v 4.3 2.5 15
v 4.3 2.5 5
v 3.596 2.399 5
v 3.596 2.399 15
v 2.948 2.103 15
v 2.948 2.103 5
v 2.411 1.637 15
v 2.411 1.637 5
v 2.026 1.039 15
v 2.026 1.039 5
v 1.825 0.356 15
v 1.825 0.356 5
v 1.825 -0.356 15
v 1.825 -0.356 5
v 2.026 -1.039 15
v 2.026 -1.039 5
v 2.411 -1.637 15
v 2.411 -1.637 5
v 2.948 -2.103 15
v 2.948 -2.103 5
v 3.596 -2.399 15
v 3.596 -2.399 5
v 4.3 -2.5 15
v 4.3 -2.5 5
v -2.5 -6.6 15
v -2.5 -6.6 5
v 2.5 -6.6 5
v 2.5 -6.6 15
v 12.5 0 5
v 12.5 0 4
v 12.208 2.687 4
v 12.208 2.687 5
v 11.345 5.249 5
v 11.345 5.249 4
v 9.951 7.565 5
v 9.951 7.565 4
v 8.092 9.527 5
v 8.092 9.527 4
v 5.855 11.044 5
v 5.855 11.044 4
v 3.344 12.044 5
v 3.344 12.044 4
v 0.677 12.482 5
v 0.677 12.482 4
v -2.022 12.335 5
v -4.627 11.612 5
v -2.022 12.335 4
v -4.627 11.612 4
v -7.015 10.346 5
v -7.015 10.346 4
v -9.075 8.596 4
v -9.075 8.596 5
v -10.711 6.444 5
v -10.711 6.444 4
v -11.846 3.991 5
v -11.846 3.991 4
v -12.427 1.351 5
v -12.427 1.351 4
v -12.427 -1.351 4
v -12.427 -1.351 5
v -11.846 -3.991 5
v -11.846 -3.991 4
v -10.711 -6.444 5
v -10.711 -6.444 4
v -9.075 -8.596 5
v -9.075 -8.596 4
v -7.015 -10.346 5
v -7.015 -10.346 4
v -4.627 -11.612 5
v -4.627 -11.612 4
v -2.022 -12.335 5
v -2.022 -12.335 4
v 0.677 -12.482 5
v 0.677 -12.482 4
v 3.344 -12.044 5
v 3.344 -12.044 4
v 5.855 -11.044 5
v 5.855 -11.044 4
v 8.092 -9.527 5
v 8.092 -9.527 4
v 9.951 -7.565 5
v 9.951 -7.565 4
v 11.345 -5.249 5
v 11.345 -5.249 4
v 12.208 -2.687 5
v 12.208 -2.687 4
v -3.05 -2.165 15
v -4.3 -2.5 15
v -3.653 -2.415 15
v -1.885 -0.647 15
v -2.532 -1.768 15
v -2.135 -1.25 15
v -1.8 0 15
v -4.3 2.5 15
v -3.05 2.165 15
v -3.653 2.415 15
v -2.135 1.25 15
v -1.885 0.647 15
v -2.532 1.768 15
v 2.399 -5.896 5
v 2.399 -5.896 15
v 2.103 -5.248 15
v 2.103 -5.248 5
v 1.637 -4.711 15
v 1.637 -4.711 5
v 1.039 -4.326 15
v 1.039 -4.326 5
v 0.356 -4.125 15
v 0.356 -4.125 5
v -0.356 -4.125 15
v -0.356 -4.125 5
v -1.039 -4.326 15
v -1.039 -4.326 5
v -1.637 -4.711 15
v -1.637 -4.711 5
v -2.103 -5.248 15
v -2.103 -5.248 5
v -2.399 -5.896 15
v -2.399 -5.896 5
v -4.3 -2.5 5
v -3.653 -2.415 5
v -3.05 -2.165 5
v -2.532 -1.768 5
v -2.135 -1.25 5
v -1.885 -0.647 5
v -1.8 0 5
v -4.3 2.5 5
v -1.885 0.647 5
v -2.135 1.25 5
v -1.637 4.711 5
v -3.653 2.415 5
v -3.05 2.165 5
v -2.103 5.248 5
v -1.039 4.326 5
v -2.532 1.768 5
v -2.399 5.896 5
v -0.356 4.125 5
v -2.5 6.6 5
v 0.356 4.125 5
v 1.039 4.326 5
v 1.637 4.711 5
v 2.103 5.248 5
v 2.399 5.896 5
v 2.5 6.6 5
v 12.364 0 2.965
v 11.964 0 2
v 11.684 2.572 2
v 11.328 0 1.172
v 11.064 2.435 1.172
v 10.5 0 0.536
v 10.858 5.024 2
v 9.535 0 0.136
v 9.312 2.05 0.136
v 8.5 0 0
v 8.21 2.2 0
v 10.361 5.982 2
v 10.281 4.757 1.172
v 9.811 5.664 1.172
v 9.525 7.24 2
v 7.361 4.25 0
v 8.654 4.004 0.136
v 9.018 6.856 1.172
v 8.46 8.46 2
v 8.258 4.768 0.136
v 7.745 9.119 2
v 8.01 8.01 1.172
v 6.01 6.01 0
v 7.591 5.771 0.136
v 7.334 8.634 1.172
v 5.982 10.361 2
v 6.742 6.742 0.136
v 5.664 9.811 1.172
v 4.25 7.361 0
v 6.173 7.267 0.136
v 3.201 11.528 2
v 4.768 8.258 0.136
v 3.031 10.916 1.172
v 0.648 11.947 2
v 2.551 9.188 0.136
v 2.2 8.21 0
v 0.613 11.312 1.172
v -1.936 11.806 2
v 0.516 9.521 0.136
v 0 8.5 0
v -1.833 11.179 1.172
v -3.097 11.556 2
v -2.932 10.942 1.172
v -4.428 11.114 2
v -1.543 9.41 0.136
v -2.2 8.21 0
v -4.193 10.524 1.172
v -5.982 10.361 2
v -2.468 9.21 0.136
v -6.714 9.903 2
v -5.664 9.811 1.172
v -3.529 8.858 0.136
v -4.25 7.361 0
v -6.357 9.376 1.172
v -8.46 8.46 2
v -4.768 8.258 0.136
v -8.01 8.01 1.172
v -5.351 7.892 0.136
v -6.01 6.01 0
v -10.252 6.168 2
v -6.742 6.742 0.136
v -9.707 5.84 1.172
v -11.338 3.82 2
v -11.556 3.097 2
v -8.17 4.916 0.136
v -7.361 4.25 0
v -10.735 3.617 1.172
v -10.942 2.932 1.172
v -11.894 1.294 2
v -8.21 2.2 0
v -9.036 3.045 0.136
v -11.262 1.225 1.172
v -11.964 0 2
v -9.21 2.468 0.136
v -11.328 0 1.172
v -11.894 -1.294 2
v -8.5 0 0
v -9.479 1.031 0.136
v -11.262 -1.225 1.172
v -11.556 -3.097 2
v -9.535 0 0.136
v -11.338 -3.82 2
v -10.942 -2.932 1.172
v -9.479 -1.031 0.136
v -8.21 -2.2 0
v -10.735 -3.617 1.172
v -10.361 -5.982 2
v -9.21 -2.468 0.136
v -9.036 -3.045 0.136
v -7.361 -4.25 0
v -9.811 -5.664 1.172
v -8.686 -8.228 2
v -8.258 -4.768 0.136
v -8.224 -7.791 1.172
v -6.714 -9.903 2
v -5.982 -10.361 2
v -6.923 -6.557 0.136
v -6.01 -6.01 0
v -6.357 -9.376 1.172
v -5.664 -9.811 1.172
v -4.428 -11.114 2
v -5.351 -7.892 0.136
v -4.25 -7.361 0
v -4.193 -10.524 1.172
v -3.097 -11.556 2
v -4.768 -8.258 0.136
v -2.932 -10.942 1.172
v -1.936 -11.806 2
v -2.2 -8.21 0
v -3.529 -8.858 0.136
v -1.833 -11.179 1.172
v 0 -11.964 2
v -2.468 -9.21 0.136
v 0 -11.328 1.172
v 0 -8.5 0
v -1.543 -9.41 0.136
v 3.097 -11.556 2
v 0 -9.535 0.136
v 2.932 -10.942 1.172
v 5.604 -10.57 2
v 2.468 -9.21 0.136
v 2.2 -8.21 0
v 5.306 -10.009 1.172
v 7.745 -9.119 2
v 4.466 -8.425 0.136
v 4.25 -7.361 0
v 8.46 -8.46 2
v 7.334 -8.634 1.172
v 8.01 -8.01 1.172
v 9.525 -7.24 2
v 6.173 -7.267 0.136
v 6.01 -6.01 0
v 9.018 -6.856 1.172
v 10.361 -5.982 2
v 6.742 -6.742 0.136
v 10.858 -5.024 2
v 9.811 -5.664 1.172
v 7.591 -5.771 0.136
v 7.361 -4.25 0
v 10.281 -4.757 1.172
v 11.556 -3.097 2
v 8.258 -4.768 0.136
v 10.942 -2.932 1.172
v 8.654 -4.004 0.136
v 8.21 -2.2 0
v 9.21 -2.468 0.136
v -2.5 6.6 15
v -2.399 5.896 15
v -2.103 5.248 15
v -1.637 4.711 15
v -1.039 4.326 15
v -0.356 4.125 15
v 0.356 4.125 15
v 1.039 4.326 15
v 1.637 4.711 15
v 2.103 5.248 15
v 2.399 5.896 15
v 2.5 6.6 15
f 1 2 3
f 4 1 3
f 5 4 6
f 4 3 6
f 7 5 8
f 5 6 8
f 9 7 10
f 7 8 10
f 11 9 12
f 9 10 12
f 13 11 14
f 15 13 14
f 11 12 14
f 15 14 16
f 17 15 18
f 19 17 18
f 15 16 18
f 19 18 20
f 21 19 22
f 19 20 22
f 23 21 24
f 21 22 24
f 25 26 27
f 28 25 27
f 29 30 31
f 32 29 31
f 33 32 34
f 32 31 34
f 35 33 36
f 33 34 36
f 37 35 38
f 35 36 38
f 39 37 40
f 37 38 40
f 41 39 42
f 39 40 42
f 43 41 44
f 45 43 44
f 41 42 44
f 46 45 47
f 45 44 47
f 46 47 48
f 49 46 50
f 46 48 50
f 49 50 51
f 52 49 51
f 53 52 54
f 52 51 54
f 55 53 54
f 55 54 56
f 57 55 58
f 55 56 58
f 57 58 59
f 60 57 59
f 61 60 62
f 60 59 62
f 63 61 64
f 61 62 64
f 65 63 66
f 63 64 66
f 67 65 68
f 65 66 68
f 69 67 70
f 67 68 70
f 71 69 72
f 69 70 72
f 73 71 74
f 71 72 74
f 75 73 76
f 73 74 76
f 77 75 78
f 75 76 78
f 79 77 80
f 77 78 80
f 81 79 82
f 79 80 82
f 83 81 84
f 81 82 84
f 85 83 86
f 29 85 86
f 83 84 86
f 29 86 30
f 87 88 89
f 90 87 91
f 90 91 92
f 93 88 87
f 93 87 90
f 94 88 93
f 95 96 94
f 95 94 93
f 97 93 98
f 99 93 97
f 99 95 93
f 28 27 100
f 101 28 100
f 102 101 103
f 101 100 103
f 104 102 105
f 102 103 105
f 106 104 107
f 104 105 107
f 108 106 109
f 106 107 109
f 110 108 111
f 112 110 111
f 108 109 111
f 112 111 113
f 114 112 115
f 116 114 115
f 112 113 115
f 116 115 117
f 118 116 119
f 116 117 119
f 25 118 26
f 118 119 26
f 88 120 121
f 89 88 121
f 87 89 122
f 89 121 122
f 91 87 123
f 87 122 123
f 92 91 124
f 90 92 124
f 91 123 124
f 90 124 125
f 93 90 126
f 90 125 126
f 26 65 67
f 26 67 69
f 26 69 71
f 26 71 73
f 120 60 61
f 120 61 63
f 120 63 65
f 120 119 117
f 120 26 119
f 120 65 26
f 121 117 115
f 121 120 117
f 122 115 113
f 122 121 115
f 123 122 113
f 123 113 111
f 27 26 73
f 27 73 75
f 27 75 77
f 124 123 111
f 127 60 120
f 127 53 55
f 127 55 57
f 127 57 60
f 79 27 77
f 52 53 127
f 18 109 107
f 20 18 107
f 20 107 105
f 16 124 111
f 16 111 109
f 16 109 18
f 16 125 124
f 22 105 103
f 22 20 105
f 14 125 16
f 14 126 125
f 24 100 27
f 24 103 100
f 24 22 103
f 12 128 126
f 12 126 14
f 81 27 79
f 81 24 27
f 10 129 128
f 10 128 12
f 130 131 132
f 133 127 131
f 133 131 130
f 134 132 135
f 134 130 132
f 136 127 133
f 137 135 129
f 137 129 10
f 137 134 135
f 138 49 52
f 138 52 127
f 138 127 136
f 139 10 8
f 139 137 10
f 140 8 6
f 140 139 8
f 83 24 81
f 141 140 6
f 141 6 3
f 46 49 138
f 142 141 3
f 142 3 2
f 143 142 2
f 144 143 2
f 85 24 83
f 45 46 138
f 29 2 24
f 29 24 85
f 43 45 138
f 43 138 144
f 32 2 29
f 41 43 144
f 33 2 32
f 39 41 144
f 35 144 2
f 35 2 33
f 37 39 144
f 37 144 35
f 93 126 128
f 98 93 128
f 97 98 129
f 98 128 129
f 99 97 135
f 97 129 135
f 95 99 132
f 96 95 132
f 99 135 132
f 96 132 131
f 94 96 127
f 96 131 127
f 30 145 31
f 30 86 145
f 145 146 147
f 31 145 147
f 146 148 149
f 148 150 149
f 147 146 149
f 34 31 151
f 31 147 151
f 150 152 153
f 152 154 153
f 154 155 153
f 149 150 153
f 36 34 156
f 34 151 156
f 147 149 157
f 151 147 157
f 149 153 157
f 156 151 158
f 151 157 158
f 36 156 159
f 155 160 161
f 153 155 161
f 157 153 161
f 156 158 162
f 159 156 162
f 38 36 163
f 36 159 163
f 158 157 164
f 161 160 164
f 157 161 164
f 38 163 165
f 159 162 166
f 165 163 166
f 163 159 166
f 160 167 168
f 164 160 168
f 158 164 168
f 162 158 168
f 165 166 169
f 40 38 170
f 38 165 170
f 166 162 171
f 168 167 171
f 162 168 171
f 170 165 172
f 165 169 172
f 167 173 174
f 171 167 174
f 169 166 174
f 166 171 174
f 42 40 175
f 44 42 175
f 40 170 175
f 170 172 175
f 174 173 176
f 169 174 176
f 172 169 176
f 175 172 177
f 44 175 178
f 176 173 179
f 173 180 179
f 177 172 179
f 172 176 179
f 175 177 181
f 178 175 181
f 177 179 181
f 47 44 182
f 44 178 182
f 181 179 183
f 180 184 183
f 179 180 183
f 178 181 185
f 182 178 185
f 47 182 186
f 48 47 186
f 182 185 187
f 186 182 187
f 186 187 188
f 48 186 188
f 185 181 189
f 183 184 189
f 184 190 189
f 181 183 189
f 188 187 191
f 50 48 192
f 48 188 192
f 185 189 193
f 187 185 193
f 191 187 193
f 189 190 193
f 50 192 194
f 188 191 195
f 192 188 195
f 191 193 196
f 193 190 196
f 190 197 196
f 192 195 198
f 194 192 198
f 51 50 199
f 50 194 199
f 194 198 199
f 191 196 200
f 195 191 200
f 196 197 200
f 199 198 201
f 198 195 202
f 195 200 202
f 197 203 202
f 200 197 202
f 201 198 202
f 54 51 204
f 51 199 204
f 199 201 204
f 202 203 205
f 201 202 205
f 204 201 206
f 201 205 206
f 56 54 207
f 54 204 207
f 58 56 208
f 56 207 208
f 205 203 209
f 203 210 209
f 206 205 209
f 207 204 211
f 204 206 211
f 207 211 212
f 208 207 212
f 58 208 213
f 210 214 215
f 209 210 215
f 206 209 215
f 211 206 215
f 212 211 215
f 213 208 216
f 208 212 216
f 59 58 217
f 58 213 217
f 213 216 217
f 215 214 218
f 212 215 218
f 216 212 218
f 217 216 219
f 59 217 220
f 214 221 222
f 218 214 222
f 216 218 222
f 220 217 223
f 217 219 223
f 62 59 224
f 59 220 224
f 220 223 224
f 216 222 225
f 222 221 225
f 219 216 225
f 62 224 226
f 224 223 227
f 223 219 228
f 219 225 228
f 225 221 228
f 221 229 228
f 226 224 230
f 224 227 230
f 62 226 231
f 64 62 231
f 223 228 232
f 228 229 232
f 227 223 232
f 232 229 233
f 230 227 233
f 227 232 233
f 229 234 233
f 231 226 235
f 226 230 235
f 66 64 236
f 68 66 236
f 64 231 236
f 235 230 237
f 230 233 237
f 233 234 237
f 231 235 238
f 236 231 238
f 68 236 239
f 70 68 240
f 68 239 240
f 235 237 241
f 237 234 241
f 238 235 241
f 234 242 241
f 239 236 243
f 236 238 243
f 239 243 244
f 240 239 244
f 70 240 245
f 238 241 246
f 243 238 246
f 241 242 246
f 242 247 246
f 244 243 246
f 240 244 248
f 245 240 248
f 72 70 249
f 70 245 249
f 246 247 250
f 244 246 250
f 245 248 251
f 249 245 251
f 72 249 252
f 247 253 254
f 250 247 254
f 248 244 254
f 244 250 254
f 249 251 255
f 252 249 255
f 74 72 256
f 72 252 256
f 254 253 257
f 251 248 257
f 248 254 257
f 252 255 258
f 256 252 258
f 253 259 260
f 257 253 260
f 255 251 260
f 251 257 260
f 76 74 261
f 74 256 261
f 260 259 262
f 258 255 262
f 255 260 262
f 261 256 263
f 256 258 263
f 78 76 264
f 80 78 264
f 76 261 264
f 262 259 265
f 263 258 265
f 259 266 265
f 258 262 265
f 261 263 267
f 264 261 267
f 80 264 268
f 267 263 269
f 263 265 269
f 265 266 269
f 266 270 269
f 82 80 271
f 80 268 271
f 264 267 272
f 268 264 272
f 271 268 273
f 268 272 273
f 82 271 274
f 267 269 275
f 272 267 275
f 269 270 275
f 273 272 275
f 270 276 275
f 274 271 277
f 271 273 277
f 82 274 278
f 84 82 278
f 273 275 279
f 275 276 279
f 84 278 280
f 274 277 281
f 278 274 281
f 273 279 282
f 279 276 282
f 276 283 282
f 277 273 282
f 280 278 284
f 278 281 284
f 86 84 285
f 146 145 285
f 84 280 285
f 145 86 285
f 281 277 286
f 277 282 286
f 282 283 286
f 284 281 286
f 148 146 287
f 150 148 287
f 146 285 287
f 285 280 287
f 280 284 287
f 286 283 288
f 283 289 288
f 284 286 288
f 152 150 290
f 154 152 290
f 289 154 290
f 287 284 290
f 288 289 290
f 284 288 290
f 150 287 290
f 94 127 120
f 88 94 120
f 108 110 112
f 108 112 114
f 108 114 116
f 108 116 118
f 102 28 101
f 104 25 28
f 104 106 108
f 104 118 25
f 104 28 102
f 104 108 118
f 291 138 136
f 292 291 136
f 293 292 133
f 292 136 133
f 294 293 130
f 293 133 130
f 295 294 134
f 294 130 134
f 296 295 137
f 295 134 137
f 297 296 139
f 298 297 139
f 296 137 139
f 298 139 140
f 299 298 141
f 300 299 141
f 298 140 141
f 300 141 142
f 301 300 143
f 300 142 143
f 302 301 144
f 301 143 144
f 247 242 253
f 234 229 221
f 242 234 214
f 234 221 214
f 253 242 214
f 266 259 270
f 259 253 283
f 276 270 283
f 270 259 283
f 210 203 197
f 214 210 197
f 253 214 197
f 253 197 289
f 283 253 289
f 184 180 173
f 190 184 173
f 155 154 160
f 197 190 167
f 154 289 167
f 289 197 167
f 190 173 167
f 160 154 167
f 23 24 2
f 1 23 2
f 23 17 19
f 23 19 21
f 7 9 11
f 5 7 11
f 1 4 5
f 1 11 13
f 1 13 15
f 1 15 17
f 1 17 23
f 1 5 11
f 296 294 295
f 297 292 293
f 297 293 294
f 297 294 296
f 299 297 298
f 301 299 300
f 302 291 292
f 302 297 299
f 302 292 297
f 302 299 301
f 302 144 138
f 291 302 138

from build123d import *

# Parameters (mm, degrees)
F0_R     = 12.5
F1_DEPTH = 5
F2_R     = 4
F4_DEPTH = 10


with BuildPart() as f1:
    # F0 (on Top) → F1 (new body)
    with BuildSketch(Plane.XY):
        Circle(F0_R)
    extrude(amount=F1_DEPTH)

    # F2
    f2_edges = [f1.edges().sort_by_distance(p)[0] for p in [
        (-12.5, 0, 0),
    ]]
    fillet(f2_edges, radius=F2_R)

    # F3 (on face) → F4 (join)
    with BuildSketch(Plane.XY.offset(5)):
        with BuildLine():
            ThreePointArc((-1.8, 0), (-2.532233047, 1.767766953), (-4.3, 2.5))
            Line((-4.3, 2.5), (-4.3, -2.5))
            ThreePointArc((-4.3, -2.5), (-2.532233047, -1.767766953), (-1.8, 0))
        make_face()
        with BuildLine():
            ThreePointArc((-2.5, 6.6), (0, 4.1), (2.5, 6.6))
            Line((2.5, 6.6), (-2.5, 6.6))
        make_face()
        with BuildLine():
            Line((-2.5, -6.6), (2.5, -6.6))
            ThreePointArc((2.5, -6.6), (0, -4.1), (-2.5, -6.6))
        make_face()
        with BuildLine():
            Line((4.3, -2.5), (4.3, 2.5))
            ThreePointArc((4.3, 2.5), (1.8, 0), (4.3, -2.5))
        make_face()
    extrude(amount=F4_DEPTH)


solid = f1.part
